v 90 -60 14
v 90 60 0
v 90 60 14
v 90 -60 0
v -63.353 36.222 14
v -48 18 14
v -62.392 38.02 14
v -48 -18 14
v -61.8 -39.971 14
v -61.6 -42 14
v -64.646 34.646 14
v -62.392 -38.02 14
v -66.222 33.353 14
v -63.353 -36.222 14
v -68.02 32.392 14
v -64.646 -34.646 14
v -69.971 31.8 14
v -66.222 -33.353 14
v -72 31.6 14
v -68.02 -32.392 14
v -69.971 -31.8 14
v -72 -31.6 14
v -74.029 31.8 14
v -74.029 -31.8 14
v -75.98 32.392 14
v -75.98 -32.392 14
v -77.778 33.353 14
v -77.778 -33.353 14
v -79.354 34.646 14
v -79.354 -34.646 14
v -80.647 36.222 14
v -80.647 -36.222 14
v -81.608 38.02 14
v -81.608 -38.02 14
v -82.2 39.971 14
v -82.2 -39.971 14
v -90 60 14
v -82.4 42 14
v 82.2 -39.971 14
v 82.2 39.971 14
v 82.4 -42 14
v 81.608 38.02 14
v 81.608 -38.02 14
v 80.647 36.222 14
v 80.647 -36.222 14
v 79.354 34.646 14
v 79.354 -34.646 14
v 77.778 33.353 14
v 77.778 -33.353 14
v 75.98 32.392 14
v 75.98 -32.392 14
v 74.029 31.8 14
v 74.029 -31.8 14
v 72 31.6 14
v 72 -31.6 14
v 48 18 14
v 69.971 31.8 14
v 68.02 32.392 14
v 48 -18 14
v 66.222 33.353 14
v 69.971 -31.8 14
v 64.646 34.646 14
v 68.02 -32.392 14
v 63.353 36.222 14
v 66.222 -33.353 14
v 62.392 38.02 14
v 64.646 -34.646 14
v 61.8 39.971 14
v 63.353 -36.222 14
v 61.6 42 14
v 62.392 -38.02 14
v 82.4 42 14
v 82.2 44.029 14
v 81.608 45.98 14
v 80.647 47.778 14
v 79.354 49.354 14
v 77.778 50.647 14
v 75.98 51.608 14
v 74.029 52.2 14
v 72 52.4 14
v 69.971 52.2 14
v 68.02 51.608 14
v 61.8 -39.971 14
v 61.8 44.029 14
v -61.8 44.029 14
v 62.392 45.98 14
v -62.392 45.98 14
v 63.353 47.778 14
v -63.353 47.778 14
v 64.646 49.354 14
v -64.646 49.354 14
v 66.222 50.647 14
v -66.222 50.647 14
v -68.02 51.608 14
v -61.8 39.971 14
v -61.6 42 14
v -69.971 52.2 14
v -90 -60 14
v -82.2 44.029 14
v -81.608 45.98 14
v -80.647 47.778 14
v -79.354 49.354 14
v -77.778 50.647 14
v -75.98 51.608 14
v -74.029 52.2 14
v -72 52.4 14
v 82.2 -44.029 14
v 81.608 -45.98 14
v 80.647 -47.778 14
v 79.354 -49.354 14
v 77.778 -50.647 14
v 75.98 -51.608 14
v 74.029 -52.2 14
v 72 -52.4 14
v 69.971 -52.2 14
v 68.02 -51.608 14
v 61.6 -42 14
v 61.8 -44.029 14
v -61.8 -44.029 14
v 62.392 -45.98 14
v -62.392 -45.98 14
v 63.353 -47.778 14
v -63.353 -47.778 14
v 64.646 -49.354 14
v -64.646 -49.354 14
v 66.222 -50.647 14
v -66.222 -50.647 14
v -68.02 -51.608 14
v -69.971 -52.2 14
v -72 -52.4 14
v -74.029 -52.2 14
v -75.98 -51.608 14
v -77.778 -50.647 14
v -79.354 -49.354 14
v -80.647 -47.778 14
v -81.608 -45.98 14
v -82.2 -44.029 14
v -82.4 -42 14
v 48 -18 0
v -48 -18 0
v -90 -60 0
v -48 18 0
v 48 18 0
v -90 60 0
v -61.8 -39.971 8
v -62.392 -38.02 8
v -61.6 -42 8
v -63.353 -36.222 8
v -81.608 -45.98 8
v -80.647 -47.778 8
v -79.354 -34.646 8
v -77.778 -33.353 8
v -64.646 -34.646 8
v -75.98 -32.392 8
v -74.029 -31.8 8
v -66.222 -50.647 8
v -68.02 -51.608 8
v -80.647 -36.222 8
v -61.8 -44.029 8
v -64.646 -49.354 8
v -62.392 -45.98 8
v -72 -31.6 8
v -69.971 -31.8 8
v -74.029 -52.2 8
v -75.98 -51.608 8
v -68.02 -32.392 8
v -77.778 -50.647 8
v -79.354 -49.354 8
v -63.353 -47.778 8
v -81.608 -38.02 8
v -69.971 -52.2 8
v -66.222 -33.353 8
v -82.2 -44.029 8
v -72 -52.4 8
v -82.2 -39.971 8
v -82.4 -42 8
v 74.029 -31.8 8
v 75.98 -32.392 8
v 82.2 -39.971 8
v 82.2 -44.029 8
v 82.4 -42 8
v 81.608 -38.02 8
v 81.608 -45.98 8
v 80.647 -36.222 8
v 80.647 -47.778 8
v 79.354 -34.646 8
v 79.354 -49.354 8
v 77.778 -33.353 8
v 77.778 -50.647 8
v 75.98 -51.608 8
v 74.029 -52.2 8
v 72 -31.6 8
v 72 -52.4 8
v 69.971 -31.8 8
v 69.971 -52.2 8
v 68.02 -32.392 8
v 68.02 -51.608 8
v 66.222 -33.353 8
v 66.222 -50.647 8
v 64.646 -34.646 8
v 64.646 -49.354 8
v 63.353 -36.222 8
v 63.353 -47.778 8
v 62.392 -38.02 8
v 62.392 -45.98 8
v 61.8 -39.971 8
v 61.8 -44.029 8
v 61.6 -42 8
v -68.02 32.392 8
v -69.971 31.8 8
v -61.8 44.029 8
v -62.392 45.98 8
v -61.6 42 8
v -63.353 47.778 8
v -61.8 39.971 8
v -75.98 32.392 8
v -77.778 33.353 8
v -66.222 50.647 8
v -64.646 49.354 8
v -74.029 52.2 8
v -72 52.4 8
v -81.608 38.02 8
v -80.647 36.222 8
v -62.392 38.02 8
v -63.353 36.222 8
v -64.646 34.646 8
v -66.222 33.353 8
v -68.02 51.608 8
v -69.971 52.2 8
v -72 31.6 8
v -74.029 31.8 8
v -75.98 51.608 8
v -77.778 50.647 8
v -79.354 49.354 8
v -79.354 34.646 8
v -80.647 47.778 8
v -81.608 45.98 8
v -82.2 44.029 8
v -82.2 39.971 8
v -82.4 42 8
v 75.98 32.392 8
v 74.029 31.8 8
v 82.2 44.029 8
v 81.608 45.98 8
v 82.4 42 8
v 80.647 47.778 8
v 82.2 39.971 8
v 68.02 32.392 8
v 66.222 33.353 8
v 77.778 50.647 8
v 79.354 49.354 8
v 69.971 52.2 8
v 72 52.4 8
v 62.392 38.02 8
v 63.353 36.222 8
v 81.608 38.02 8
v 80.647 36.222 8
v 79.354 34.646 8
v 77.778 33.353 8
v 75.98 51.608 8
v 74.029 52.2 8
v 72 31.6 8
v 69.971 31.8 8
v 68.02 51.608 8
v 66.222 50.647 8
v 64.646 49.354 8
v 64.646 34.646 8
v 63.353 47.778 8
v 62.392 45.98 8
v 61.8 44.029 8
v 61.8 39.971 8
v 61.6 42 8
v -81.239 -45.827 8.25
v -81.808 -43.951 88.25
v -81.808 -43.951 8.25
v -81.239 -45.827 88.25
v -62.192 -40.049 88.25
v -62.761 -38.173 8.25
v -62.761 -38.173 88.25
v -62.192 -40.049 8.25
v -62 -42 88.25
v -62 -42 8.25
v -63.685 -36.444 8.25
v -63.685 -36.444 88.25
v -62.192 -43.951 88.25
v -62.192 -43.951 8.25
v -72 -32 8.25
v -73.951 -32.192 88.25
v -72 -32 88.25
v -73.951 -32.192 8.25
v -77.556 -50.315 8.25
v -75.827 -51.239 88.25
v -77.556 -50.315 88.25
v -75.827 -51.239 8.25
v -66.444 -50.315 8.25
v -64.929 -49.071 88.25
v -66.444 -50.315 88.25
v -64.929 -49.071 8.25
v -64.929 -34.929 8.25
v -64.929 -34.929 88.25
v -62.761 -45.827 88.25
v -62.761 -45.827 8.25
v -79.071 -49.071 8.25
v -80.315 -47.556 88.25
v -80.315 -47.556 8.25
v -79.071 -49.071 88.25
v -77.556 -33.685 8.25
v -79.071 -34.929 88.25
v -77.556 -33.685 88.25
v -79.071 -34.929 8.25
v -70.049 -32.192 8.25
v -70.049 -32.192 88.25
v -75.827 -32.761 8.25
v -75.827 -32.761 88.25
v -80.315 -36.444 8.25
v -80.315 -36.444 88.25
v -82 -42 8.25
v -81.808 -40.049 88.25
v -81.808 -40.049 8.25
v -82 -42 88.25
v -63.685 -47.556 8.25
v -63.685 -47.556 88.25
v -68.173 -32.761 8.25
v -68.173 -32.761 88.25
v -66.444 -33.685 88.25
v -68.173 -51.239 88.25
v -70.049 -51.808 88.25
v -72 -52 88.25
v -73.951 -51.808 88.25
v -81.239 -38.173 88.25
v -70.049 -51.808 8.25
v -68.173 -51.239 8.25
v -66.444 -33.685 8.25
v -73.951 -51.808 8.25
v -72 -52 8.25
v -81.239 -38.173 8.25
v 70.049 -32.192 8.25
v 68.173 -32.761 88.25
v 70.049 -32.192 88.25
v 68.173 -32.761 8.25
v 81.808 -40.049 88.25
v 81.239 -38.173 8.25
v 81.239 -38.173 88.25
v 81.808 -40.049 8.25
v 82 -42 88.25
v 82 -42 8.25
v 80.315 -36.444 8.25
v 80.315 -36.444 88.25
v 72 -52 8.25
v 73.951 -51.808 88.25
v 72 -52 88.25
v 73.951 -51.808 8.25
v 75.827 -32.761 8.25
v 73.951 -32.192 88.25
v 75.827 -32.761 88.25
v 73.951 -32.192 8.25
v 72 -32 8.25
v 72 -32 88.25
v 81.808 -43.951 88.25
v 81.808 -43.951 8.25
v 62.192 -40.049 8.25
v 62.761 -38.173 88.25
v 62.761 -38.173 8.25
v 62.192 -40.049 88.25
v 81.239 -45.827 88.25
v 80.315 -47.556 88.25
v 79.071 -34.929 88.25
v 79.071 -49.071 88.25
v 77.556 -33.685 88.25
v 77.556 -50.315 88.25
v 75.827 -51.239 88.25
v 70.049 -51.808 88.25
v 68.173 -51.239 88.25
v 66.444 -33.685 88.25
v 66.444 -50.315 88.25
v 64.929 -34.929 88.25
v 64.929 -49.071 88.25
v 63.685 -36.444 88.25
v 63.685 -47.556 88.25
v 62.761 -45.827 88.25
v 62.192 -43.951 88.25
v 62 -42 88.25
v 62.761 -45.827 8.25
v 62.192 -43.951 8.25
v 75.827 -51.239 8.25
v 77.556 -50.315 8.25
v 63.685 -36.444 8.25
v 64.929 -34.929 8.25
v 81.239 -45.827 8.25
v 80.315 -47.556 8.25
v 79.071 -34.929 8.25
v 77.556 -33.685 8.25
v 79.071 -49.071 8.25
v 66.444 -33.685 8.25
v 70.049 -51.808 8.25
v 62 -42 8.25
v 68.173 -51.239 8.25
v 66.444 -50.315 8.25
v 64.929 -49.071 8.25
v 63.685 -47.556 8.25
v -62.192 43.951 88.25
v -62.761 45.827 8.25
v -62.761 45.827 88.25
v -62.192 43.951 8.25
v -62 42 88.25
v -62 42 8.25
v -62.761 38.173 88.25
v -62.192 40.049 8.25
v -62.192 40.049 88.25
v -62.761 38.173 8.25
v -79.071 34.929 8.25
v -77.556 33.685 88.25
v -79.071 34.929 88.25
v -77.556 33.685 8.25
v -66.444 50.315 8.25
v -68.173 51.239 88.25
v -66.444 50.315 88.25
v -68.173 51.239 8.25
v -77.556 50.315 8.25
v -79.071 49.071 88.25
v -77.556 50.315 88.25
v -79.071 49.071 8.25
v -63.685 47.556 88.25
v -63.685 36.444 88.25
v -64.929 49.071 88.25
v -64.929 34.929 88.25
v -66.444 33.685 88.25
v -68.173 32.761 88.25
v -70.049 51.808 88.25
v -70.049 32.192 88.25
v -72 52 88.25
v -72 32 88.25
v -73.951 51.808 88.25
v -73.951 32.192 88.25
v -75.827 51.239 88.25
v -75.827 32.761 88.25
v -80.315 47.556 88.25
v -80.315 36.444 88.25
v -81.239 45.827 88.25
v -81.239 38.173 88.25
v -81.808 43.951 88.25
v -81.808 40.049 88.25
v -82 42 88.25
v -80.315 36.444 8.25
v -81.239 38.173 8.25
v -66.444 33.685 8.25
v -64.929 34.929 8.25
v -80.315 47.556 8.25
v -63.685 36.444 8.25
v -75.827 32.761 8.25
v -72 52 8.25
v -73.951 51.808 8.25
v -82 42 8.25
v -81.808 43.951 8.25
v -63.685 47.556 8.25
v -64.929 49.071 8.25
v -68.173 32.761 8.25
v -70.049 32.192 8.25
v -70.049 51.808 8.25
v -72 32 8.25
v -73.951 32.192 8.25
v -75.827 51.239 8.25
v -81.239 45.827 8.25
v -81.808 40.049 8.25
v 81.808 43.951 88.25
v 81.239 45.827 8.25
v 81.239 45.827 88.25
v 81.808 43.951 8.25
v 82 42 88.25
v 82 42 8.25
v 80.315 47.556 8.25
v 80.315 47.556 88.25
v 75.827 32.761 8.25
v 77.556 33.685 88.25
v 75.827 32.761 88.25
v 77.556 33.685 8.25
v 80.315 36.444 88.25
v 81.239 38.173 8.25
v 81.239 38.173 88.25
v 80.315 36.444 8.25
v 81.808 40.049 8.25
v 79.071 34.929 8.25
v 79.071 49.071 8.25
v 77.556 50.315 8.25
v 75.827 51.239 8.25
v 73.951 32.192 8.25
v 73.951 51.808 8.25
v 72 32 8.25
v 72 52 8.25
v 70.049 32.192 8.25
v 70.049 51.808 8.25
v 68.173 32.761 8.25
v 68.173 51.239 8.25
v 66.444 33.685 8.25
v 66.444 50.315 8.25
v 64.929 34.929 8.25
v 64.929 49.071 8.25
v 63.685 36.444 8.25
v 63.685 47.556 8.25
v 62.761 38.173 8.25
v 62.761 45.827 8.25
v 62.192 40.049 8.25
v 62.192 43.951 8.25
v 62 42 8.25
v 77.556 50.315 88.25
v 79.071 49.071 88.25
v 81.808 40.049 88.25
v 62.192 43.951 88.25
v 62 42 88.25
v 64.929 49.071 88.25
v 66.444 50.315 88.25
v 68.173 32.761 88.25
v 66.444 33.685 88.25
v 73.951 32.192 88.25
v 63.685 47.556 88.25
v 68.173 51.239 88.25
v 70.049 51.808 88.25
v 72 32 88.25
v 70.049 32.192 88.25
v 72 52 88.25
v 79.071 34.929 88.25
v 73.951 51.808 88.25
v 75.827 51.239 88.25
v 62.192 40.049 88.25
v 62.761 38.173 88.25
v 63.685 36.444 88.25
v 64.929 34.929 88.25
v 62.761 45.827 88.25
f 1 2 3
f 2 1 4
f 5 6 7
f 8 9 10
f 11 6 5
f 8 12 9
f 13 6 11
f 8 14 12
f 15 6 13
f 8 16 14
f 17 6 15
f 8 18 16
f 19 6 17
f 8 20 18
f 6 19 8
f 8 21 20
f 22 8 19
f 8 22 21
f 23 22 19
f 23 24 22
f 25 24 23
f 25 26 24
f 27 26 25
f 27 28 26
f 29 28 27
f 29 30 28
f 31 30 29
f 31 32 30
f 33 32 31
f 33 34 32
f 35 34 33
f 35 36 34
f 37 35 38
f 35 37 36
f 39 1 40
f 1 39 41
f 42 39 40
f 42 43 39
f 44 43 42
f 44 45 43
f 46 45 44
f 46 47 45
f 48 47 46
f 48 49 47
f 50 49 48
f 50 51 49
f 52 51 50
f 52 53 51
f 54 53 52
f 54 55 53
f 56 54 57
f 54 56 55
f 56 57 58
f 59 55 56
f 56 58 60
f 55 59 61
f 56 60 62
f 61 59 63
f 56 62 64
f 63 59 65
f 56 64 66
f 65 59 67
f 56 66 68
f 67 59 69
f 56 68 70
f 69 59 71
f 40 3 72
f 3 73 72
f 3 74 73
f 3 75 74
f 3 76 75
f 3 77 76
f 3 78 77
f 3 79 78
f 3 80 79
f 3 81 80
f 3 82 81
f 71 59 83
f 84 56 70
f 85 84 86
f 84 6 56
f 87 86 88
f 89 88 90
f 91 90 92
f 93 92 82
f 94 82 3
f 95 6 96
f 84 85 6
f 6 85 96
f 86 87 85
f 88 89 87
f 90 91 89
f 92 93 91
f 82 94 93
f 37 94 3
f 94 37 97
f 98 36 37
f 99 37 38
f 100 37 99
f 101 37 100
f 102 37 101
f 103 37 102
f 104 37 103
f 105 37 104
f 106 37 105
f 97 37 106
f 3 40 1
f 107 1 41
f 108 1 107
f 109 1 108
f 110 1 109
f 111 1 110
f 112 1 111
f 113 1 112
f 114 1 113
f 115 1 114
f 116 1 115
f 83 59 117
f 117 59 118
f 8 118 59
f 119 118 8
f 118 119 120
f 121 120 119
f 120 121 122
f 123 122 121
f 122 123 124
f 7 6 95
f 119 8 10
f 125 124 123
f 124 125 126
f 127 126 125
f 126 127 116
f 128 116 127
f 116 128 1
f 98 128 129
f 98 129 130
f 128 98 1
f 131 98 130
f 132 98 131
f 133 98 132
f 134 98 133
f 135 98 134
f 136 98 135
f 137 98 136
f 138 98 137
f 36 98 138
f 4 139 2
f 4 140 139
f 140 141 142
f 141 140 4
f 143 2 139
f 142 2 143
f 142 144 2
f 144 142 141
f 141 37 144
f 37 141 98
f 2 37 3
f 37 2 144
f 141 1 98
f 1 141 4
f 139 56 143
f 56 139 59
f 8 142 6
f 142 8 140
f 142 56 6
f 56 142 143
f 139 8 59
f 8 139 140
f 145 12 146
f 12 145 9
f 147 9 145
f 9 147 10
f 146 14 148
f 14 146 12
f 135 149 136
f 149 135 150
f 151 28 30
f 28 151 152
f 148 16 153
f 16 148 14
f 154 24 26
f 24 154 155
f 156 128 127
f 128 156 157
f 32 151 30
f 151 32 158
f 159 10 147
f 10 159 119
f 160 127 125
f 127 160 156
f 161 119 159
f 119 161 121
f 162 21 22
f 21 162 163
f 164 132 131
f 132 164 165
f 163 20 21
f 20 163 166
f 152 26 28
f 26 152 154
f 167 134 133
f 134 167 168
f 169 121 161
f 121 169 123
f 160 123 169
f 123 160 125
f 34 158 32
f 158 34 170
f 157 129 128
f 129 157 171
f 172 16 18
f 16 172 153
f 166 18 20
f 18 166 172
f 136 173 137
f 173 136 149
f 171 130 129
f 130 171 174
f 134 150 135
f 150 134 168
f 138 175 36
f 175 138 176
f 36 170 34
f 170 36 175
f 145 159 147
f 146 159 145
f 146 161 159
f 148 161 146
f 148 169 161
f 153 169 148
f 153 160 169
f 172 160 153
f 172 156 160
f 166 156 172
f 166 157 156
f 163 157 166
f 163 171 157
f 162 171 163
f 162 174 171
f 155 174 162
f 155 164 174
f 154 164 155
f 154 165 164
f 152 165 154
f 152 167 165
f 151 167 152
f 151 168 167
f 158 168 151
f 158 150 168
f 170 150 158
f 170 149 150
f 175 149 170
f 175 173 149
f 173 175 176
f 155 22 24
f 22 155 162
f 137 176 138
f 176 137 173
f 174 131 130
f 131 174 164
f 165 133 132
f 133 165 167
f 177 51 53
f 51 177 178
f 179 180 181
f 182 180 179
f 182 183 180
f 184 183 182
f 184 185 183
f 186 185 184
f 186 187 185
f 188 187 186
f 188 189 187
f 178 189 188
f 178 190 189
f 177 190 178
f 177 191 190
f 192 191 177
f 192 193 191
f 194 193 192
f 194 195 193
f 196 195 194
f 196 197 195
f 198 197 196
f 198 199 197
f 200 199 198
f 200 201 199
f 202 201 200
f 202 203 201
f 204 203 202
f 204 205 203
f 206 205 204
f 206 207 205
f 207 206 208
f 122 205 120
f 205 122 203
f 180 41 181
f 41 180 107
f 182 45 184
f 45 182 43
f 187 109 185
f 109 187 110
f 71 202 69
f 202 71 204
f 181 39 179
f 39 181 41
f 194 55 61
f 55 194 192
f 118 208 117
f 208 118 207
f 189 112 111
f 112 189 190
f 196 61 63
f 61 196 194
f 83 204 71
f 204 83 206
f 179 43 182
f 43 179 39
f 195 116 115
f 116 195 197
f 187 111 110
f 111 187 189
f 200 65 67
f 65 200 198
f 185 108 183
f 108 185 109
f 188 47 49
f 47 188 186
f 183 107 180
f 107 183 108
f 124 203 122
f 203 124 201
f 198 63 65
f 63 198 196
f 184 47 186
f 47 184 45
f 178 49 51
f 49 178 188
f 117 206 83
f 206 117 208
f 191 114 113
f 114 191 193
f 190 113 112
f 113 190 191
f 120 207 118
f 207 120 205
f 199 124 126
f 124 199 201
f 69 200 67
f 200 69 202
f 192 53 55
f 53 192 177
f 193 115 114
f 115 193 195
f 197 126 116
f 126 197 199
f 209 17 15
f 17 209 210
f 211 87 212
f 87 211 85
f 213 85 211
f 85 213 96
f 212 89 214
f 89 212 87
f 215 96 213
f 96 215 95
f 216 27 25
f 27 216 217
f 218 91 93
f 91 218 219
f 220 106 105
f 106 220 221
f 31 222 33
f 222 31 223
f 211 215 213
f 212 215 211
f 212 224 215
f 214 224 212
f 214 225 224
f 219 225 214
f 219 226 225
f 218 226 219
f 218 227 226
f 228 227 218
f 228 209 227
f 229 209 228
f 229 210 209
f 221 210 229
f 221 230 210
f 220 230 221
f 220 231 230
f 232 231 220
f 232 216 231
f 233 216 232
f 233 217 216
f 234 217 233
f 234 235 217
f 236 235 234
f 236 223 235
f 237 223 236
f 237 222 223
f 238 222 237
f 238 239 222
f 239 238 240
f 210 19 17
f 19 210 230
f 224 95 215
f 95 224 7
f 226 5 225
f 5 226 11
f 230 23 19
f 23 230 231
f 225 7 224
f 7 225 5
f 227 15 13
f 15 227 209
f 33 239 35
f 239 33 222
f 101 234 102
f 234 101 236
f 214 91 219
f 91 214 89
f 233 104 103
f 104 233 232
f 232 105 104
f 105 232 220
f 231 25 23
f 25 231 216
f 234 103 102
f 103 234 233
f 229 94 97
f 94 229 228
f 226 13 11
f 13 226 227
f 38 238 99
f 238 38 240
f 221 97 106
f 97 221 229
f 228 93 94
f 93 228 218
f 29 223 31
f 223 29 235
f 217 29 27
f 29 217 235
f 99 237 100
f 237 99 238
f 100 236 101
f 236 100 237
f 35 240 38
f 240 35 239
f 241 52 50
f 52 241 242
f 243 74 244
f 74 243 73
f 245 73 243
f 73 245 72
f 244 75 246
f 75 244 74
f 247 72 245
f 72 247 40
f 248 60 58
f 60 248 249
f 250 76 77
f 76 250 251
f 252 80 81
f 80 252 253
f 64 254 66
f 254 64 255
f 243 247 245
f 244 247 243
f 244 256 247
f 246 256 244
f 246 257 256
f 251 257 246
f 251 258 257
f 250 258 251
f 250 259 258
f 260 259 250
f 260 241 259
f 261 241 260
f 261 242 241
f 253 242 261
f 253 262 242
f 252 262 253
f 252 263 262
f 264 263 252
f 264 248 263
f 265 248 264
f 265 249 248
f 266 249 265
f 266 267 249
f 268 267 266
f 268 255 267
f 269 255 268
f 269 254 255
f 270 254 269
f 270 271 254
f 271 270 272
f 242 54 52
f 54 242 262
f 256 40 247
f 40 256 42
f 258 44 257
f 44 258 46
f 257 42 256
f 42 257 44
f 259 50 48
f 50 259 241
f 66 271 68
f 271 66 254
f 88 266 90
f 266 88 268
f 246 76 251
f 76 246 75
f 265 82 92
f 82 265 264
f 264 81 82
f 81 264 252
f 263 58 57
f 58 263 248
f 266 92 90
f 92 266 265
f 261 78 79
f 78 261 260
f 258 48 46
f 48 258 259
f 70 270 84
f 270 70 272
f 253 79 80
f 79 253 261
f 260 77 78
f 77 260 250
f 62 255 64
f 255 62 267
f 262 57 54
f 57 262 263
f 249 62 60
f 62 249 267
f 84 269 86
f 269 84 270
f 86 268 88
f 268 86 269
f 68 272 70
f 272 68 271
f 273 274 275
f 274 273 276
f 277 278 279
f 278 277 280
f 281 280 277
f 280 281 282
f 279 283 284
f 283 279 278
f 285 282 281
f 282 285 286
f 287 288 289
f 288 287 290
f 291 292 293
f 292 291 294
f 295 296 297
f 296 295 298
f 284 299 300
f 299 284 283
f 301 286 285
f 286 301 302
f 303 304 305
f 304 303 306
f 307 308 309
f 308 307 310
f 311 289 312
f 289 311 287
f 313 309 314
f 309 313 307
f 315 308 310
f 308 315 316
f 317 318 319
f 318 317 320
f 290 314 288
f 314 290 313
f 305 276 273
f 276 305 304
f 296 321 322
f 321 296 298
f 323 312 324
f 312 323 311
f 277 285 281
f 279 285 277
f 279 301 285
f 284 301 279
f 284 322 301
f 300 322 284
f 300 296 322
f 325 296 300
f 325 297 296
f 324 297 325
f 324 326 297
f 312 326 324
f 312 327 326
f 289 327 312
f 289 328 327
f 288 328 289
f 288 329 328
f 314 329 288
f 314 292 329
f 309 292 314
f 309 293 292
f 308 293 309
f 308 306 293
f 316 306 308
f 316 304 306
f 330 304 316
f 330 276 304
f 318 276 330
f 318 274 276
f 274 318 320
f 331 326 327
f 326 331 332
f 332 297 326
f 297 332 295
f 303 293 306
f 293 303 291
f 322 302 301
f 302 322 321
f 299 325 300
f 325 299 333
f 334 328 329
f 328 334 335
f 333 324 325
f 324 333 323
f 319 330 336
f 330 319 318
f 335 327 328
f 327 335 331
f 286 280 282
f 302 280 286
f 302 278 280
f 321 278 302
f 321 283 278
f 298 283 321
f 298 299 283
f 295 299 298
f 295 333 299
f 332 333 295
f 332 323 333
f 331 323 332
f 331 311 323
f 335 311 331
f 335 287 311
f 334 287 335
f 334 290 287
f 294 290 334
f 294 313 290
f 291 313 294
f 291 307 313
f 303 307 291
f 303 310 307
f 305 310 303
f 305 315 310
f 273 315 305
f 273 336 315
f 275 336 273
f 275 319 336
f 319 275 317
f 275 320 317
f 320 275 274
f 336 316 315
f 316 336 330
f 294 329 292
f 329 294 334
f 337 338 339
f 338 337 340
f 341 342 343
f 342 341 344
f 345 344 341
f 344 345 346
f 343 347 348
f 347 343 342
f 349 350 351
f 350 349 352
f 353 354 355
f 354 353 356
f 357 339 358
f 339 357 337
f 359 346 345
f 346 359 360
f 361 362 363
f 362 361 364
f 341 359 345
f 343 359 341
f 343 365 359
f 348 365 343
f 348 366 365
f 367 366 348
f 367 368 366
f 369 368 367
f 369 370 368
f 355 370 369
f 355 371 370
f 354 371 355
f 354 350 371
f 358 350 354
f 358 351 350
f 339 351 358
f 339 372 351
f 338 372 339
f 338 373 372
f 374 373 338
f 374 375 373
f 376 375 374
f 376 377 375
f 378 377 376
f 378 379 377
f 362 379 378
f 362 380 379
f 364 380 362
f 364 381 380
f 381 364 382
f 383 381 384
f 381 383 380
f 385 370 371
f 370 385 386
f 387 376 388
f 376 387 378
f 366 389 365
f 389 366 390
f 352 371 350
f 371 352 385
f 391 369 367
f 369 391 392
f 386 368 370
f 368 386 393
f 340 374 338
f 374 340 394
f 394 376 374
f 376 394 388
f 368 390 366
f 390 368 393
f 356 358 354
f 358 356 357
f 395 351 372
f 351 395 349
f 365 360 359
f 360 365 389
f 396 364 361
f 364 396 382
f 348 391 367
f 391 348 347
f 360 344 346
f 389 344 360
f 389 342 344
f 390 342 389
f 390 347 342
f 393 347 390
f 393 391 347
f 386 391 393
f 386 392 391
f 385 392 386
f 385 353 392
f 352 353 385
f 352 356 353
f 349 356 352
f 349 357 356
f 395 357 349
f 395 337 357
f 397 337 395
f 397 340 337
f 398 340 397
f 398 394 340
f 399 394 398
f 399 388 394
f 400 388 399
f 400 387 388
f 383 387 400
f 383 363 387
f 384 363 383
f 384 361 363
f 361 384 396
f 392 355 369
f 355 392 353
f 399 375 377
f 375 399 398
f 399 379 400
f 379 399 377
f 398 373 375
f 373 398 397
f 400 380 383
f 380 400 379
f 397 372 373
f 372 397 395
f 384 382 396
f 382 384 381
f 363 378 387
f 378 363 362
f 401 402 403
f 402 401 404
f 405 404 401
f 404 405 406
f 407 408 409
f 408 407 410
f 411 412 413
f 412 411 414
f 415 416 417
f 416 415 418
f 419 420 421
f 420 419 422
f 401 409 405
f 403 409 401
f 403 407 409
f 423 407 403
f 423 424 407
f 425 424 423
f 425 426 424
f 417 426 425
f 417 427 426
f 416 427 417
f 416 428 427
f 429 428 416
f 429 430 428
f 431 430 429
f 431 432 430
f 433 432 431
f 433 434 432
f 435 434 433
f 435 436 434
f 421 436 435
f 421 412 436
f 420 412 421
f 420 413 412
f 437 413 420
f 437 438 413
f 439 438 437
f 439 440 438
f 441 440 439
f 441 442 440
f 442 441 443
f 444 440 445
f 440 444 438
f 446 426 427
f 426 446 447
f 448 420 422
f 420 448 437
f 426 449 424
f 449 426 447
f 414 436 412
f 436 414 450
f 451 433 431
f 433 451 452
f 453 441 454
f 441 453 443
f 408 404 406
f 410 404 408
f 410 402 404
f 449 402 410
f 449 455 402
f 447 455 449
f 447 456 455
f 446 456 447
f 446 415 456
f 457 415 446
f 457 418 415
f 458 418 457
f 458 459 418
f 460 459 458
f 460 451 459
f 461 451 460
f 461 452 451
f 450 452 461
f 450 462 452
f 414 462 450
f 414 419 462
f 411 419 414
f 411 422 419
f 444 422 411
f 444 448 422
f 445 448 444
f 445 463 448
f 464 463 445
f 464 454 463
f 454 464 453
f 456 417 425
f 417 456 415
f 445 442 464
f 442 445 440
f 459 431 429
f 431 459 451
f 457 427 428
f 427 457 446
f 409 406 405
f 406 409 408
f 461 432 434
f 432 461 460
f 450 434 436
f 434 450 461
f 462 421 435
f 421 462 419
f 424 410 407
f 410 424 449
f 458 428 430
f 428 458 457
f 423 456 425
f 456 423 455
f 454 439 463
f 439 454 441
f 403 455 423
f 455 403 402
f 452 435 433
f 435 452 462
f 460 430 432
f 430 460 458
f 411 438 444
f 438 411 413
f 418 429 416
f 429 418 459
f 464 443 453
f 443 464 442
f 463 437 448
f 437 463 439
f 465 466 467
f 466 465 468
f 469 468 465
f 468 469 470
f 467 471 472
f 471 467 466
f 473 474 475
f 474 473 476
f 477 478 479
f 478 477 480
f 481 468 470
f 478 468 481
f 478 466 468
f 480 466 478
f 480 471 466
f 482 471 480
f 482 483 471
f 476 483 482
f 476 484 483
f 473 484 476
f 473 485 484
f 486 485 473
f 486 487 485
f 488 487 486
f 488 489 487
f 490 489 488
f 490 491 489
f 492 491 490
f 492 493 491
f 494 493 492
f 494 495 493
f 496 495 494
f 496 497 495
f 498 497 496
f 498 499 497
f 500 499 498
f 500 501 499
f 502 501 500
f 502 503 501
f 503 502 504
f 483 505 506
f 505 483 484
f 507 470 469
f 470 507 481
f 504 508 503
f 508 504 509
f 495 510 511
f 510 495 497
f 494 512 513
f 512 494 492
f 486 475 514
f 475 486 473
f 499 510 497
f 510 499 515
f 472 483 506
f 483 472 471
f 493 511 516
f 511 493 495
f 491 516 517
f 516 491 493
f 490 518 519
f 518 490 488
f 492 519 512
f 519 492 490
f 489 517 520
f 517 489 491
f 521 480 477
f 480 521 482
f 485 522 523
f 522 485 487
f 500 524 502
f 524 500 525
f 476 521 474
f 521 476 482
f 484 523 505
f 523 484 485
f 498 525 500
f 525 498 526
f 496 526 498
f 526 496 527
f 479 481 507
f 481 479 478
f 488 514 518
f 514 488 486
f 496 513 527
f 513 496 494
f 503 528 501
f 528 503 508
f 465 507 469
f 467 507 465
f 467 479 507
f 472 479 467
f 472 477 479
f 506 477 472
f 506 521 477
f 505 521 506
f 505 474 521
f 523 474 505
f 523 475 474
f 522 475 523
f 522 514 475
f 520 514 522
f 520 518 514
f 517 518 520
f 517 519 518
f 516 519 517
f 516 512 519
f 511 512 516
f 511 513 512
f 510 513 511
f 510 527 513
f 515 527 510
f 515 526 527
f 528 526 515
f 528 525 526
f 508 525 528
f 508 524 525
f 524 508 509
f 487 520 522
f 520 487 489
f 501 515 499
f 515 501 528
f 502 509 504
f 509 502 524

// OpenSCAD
$fn = 32;

// ------------------------------------------------------------------------
// Frame with four posts: 180 x 120 mm frame, four d20 posts
// Every part is its own module, assembly() places them once.
// ------------------------------------------------------------------------

// --- part 1 ---
module base_frame() {
  difference() {
    translate([-90, -60, 0]) cube([180, 120, 14]);
    translate([-48, -18, -1]) cube([96, 36, 16]);
    translate([-72, -42, 8]) cylinder(h = 7, d = 20.8);
    translate([72, -42, 8]) cylinder(h = 7, d = 20.8);
    translate([-72, 42, 8]) cylinder(h = 7, d = 20.8);
    translate([72, 42, 8]) cylinder(h = 7, d = 20.8);
  }
}

// --- part 2 ---
module post1() {
  cylinder(h = 80, d = 20);
}

// --- part 3 ---
module post2() {
  cylinder(h = 80, d = 20);
}

// --- part 4 ---
module post3() {
  cylinder(h = 80, d = 20);
}

// --- part 5 ---
module post4() {
  cylinder(h = 80, d = 20);
}

// --- assembly ---
module assembly() {
  translate([0, 0, 0]) rotate([0, 0, 0]) base_frame();
  translate([-72, -42, 8.25]) rotate([0, 0, 0]) post1();
  translate([72, -42, 8.25]) rotate([0, 0, 0]) post2();
  translate([-72, 42, 8.25]) rotate([0, 0, 0]) post3();
  translate([72, 42, 8.25]) rotate([0, 0, 0]) post4();
}

assembly();
